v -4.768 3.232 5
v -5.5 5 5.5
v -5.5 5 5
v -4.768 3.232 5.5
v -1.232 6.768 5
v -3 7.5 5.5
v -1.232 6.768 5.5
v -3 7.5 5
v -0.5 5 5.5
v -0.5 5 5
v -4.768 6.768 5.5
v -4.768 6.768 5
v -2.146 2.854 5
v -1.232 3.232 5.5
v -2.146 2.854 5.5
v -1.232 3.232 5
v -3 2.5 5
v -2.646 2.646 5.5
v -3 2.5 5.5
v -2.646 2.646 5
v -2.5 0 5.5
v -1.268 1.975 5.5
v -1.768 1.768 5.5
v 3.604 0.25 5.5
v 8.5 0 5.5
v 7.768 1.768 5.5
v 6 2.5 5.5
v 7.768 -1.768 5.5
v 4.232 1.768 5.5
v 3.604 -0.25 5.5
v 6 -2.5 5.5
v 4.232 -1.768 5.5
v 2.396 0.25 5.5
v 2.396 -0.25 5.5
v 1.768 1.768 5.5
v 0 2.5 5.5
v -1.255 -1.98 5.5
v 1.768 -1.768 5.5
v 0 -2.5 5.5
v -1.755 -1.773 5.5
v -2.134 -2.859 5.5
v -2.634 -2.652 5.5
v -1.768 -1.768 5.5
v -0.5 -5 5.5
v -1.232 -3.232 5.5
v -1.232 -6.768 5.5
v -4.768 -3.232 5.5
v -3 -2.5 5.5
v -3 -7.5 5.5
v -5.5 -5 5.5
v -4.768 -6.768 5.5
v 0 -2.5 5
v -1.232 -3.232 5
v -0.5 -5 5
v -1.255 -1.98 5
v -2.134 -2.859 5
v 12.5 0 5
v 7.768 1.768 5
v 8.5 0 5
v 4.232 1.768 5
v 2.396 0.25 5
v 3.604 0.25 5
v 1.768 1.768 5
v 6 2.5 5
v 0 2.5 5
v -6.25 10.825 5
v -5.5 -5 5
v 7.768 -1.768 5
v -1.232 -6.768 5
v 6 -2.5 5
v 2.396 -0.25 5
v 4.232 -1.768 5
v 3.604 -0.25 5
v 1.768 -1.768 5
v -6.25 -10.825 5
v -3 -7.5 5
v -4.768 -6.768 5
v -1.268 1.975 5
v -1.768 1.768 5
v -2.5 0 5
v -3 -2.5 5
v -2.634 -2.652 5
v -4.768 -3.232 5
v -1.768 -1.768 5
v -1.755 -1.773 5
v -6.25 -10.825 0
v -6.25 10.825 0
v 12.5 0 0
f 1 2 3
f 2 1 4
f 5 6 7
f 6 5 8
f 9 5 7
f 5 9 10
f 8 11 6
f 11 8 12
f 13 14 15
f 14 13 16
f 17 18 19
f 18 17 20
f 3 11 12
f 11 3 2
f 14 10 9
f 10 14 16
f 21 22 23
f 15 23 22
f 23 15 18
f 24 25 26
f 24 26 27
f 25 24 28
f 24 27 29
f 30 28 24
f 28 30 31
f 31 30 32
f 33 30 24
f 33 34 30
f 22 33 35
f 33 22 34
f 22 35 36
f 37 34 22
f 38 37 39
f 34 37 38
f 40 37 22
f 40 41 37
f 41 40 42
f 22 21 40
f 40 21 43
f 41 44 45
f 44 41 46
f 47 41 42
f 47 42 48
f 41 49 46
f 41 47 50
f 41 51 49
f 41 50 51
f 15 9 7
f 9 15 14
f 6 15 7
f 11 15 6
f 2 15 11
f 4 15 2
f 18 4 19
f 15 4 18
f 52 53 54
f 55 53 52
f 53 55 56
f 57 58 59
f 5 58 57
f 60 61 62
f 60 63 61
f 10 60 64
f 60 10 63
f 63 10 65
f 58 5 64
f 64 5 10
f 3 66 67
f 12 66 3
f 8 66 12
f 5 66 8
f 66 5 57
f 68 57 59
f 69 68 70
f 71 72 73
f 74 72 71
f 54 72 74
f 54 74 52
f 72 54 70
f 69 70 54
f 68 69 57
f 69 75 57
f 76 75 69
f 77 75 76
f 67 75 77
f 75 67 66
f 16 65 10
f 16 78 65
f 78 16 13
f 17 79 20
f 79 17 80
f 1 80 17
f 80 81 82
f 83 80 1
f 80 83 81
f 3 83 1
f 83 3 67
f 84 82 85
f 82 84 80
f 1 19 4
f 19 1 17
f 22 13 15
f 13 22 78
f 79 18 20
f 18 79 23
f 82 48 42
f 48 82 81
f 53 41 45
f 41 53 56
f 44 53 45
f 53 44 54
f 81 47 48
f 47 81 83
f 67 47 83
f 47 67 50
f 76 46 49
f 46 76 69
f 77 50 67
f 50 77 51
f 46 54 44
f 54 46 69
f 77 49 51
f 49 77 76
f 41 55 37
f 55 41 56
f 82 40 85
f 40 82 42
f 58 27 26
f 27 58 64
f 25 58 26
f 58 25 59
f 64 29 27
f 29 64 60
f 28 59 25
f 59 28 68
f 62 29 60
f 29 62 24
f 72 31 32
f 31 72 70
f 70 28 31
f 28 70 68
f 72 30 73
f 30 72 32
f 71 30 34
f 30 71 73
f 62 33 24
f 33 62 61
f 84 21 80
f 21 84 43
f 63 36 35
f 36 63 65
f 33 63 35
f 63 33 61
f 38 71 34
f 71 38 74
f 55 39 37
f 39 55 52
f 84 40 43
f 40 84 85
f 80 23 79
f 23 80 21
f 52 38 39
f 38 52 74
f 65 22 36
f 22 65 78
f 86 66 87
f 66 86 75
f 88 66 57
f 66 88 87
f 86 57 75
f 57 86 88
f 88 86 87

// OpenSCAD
// file: common.scad
module arrow() {
    union() {
        translate([-3,-1.5,0]) cube([4,3,0.5]);
        translate([2.5,0,0]) cylinder(0.5,3,3,$fn=3);
    }
}
// main file
include <common.scad>;

color([0,0.75,1]) cylinder(5,12.5,12.5,false,$fn=3);

$node_size=2.5;
$line_h=0.5;
$line_w=0.5;

color([1,1,1])  union() {
    translate([-3,5,5]) cylinder(0.5,$node_size,$node_size);
    translate([0,0,5]) rotate(45) cube([$line_w,5,$line_h]);
    translate([-3,-5,5]) cylinder(0.5,$node_size,$node_size);
    translate([0.35,-0.375,5]) rotate(135) cube([$line_w,5,$line_h]);
    translate([6,0,5]) cylinder(0.5,$node_size,$node_size);
    translate([0,0.25,5]) rotate(270) cube([$line_w,5,$line_h]);
    translate([0,0,5]) cylinder(0.5,$node_size,$node_size);
}
